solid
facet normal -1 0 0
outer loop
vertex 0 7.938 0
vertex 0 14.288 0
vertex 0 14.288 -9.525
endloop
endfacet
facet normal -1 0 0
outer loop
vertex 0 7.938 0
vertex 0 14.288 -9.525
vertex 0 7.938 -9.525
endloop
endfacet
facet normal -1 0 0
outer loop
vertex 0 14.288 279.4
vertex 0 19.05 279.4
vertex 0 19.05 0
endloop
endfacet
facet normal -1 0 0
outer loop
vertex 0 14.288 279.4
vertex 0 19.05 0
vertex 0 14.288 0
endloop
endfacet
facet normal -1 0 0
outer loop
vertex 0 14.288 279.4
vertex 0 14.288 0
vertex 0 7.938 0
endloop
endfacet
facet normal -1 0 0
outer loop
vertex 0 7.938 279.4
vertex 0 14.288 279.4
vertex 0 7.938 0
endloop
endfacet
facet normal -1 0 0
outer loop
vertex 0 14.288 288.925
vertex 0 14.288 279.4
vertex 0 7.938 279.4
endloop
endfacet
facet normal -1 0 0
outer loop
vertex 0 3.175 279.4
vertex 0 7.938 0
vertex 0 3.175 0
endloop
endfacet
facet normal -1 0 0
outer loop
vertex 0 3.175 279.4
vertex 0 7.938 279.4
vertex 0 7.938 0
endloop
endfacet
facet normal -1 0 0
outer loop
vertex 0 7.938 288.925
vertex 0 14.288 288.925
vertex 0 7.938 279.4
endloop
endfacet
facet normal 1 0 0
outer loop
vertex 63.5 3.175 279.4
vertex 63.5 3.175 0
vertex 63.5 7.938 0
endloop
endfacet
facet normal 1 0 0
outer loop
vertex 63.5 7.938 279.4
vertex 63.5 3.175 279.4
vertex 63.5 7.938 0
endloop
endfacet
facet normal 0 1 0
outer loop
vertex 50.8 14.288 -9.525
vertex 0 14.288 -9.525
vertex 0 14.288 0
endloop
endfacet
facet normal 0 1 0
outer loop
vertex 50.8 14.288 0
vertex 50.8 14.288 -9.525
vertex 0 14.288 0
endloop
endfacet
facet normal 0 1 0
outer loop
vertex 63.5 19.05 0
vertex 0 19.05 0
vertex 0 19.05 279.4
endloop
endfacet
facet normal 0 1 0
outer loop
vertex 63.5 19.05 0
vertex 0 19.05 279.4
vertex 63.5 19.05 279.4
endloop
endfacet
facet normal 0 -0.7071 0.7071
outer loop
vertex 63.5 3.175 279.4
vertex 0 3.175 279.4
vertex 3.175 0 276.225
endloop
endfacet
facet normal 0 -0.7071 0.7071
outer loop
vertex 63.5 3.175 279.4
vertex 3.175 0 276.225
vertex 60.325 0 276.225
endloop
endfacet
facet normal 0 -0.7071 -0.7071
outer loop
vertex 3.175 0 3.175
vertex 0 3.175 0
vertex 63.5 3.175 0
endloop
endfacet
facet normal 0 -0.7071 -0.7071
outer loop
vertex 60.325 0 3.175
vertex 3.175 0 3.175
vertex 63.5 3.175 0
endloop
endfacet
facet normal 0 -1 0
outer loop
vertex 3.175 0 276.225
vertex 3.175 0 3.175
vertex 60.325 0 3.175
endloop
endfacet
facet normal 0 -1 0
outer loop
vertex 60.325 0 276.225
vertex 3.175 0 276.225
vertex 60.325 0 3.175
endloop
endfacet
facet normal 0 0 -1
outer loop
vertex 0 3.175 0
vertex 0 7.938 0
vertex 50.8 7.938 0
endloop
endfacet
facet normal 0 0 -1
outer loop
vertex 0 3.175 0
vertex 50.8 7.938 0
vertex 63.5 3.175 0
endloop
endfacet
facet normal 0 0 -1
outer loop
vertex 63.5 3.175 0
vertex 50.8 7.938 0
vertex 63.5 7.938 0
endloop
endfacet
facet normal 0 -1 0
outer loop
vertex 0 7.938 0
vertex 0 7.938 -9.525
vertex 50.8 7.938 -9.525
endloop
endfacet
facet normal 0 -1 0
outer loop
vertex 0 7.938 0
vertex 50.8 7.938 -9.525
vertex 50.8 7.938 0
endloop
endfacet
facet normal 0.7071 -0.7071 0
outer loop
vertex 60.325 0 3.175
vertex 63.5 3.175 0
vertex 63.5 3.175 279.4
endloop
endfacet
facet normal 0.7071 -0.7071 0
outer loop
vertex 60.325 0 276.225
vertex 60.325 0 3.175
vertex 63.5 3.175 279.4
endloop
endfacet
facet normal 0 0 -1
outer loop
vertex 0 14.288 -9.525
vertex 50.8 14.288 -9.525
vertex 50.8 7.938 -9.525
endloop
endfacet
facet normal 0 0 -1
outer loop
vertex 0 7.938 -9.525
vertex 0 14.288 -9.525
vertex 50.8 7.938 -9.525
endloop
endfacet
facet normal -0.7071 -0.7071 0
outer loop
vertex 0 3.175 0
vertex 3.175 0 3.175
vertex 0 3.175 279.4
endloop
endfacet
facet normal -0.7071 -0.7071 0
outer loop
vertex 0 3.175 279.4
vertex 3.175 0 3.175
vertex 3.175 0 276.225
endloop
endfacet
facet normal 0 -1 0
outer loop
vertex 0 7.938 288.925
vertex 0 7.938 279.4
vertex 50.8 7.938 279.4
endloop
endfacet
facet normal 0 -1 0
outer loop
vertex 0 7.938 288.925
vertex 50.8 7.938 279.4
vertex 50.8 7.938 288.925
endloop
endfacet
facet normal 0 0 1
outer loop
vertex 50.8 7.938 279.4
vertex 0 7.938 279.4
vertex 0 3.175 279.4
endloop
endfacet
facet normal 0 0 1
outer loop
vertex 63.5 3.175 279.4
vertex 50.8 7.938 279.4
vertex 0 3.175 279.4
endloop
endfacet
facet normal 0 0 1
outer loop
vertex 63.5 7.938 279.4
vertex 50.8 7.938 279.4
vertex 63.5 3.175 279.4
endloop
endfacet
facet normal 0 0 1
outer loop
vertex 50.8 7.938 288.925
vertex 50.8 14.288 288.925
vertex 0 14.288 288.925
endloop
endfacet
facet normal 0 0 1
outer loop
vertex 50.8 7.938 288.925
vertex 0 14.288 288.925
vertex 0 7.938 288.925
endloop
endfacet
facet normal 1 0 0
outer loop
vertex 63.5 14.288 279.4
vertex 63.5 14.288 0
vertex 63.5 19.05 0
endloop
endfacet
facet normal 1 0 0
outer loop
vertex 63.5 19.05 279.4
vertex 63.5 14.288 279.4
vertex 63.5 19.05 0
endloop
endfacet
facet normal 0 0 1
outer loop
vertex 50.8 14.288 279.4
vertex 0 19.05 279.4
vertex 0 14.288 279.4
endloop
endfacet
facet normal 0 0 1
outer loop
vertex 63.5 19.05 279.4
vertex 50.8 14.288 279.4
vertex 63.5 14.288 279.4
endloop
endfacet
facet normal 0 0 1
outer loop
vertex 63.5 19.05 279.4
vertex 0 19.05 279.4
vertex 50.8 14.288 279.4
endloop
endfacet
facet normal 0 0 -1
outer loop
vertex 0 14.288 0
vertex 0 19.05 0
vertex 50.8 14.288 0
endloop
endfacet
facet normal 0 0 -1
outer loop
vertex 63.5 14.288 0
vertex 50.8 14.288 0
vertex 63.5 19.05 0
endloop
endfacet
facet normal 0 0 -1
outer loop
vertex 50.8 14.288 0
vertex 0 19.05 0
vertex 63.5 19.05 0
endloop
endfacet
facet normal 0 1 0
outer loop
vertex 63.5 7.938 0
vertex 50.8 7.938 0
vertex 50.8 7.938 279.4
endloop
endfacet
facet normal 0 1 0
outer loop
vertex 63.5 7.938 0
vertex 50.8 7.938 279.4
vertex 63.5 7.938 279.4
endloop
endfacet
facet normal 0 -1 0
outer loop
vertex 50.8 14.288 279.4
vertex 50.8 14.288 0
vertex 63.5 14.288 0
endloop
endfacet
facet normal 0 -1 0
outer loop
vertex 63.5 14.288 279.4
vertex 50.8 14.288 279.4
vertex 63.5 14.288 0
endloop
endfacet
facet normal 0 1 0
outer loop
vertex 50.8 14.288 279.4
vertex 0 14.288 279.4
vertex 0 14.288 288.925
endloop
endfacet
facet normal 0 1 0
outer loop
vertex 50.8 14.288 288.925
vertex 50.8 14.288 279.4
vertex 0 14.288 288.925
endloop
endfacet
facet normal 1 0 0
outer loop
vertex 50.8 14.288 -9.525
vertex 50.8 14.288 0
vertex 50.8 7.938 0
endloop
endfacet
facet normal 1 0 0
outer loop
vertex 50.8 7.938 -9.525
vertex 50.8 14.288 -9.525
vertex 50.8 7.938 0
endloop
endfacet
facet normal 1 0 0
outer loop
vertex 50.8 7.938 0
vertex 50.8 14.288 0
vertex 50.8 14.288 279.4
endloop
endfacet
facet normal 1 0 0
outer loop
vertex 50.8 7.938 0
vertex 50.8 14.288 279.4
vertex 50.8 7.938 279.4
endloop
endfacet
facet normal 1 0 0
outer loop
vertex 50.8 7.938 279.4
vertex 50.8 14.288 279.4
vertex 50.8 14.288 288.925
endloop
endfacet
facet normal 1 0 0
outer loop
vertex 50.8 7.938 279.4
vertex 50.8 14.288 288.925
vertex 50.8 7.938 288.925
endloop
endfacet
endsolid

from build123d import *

# Parameters (mm, degrees)
F0_W     = 63.5
F0_H     = 19.05
F1_DEPTH = 279.4
F2_SIZE  = 3.175
F3_W     = 12.7
F3_H     = 6.35
F4_DEPTH = 279.401
F5_W     = 6.35
F5_H     = 9.525
F6_DEPTH = 50.8


with BuildPart() as f1:
    # F0 (on Top) → F1 (new body)
    with BuildSketch(Plane.XY):
        with Locations((31.75, 9.525)):
            Rectangle(F0_W, F0_H)
    extrude(amount=F1_DEPTH)

    # F2
    f2_edges = [f1.edges().sort_by_distance(p)[0] for p in [
        (0, 0, 139.7),
        (31.75, 0, 279.4),
        (63.5, 0, 139.7),
        (31.75, 0, 0),
    ]]
    chamfer(f2_edges, length=F2_SIZE)

    # F3 (on face) → F4 (cut, through all)
    with BuildSketch(Plane(origin=(0, 0, 0), x_dir=(1, 0, 0), z_dir=(0, 0, -1))):
        with Locations((57.15, -11.1125)):
            Rectangle(F3_W, F3_H)
    extrude(amount=-F4_DEPTH, mode=Mode.SUBTRACT)

    # F5 (on face) → F6 (join)
    with BuildSketch(Plane(origin=(0, 0, 0), x_dir=(0, -1, 0), z_dir=(-1, 0, 0))):
        with Locations((-11.1125, 284.1625)):
            Rectangle(F5_W, F5_H)
        with Locations((-11.1125, -4.7625)):
            Rectangle(F5_W, F5_H)
    extrude(amount=-F6_DEPTH)


solid = f1.part
